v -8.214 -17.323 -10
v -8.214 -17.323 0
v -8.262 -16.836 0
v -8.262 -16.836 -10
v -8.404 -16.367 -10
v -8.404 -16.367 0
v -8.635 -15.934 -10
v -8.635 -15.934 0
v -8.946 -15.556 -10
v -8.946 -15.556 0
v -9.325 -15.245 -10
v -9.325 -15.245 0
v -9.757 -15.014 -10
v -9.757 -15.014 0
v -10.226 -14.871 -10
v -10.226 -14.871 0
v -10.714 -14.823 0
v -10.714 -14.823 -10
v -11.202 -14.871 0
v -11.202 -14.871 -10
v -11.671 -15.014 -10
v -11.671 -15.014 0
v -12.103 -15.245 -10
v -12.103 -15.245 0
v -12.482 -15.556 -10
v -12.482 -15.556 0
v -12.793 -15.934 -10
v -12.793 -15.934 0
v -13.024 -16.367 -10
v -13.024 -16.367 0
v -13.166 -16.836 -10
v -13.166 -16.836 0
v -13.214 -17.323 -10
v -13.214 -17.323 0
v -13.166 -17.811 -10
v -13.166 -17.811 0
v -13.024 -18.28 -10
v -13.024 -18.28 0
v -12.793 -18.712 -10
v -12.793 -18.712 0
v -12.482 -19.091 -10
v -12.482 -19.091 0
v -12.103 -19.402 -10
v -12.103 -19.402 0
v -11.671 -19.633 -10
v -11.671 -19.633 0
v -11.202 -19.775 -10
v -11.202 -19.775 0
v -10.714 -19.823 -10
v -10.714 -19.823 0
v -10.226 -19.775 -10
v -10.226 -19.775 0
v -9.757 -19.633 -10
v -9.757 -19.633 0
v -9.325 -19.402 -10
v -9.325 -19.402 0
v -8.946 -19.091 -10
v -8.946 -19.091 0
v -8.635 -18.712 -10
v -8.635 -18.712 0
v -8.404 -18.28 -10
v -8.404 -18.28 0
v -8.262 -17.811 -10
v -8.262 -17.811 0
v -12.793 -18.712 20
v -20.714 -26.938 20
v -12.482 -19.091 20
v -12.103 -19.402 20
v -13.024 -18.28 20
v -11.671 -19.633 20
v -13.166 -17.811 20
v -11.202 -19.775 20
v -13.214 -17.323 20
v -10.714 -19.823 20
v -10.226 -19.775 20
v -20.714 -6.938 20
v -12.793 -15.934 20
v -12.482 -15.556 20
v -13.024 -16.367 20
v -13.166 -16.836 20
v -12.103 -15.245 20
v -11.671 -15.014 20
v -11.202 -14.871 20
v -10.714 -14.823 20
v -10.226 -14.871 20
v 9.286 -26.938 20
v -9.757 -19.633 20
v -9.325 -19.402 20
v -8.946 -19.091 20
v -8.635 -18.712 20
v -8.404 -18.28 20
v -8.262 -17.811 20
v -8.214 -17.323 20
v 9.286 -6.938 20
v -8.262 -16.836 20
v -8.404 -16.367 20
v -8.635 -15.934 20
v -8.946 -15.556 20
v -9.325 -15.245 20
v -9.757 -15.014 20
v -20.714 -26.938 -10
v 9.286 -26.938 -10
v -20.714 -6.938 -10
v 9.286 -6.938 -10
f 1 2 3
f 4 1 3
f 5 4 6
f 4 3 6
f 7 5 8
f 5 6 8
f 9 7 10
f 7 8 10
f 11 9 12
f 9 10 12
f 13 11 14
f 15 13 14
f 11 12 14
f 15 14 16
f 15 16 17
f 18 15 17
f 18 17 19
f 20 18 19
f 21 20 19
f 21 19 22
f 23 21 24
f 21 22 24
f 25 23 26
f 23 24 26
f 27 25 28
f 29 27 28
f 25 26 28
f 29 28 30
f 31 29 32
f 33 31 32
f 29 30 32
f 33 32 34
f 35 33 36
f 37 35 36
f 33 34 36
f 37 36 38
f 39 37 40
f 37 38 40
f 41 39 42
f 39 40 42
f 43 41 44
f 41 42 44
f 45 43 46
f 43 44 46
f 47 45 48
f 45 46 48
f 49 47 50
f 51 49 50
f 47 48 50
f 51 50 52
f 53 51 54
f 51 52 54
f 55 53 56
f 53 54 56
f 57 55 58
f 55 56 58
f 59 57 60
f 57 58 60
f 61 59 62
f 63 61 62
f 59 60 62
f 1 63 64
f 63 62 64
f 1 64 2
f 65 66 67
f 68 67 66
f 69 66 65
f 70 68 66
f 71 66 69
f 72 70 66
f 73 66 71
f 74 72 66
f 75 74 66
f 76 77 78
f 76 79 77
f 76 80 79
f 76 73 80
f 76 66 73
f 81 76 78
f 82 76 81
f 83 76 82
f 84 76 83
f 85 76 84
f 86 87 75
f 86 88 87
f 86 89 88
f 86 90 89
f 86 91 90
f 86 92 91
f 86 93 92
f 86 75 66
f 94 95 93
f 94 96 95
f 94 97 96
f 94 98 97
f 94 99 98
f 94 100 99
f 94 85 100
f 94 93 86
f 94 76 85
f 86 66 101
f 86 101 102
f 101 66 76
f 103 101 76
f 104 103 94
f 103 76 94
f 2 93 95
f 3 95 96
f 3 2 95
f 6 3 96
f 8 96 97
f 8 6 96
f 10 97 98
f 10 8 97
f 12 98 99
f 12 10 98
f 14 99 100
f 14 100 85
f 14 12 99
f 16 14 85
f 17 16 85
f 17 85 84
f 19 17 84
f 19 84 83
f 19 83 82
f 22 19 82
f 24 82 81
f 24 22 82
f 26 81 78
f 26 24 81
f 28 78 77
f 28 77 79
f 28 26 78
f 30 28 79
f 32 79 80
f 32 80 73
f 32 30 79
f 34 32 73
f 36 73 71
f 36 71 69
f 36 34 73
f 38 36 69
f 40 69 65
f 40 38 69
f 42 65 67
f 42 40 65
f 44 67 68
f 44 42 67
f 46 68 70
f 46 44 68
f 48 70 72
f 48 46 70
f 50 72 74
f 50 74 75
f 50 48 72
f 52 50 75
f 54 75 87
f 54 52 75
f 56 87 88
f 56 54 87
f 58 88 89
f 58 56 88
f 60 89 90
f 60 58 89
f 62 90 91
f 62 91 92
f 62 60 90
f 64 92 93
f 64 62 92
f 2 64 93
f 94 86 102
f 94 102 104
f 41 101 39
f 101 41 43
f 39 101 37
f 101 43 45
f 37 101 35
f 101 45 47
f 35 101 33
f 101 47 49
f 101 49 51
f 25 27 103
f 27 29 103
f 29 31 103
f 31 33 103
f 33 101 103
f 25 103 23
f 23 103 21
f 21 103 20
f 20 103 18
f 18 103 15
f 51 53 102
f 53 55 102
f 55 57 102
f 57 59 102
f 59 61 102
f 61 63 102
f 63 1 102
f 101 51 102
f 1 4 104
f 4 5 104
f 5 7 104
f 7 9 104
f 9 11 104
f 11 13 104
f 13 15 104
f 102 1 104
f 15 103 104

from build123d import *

# Parameters (mm, degrees)
F0_W          = 30
F0_H          = 20
F0_R          = 2.5
F1_DEPTH      = 20
F1_DEPTH_BACK = 10


with BuildPart() as f1:
    # F0 (on Top) → F1 (new body, two sides)
    with BuildSketch(Plane.XY) as f1_sk:
        with Locations((-5.71409, -16.938188)):
            Rectangle(F0_W, F0_H)
        with Locations((-10.71409, -17.323306)):
            Circle(F0_R, mode=Mode.SUBTRACT)
    extrude(amount=F1_DEPTH)
    extrude(f1_sk.sketch, amount=-F1_DEPTH_BACK)


solid = f1.part
